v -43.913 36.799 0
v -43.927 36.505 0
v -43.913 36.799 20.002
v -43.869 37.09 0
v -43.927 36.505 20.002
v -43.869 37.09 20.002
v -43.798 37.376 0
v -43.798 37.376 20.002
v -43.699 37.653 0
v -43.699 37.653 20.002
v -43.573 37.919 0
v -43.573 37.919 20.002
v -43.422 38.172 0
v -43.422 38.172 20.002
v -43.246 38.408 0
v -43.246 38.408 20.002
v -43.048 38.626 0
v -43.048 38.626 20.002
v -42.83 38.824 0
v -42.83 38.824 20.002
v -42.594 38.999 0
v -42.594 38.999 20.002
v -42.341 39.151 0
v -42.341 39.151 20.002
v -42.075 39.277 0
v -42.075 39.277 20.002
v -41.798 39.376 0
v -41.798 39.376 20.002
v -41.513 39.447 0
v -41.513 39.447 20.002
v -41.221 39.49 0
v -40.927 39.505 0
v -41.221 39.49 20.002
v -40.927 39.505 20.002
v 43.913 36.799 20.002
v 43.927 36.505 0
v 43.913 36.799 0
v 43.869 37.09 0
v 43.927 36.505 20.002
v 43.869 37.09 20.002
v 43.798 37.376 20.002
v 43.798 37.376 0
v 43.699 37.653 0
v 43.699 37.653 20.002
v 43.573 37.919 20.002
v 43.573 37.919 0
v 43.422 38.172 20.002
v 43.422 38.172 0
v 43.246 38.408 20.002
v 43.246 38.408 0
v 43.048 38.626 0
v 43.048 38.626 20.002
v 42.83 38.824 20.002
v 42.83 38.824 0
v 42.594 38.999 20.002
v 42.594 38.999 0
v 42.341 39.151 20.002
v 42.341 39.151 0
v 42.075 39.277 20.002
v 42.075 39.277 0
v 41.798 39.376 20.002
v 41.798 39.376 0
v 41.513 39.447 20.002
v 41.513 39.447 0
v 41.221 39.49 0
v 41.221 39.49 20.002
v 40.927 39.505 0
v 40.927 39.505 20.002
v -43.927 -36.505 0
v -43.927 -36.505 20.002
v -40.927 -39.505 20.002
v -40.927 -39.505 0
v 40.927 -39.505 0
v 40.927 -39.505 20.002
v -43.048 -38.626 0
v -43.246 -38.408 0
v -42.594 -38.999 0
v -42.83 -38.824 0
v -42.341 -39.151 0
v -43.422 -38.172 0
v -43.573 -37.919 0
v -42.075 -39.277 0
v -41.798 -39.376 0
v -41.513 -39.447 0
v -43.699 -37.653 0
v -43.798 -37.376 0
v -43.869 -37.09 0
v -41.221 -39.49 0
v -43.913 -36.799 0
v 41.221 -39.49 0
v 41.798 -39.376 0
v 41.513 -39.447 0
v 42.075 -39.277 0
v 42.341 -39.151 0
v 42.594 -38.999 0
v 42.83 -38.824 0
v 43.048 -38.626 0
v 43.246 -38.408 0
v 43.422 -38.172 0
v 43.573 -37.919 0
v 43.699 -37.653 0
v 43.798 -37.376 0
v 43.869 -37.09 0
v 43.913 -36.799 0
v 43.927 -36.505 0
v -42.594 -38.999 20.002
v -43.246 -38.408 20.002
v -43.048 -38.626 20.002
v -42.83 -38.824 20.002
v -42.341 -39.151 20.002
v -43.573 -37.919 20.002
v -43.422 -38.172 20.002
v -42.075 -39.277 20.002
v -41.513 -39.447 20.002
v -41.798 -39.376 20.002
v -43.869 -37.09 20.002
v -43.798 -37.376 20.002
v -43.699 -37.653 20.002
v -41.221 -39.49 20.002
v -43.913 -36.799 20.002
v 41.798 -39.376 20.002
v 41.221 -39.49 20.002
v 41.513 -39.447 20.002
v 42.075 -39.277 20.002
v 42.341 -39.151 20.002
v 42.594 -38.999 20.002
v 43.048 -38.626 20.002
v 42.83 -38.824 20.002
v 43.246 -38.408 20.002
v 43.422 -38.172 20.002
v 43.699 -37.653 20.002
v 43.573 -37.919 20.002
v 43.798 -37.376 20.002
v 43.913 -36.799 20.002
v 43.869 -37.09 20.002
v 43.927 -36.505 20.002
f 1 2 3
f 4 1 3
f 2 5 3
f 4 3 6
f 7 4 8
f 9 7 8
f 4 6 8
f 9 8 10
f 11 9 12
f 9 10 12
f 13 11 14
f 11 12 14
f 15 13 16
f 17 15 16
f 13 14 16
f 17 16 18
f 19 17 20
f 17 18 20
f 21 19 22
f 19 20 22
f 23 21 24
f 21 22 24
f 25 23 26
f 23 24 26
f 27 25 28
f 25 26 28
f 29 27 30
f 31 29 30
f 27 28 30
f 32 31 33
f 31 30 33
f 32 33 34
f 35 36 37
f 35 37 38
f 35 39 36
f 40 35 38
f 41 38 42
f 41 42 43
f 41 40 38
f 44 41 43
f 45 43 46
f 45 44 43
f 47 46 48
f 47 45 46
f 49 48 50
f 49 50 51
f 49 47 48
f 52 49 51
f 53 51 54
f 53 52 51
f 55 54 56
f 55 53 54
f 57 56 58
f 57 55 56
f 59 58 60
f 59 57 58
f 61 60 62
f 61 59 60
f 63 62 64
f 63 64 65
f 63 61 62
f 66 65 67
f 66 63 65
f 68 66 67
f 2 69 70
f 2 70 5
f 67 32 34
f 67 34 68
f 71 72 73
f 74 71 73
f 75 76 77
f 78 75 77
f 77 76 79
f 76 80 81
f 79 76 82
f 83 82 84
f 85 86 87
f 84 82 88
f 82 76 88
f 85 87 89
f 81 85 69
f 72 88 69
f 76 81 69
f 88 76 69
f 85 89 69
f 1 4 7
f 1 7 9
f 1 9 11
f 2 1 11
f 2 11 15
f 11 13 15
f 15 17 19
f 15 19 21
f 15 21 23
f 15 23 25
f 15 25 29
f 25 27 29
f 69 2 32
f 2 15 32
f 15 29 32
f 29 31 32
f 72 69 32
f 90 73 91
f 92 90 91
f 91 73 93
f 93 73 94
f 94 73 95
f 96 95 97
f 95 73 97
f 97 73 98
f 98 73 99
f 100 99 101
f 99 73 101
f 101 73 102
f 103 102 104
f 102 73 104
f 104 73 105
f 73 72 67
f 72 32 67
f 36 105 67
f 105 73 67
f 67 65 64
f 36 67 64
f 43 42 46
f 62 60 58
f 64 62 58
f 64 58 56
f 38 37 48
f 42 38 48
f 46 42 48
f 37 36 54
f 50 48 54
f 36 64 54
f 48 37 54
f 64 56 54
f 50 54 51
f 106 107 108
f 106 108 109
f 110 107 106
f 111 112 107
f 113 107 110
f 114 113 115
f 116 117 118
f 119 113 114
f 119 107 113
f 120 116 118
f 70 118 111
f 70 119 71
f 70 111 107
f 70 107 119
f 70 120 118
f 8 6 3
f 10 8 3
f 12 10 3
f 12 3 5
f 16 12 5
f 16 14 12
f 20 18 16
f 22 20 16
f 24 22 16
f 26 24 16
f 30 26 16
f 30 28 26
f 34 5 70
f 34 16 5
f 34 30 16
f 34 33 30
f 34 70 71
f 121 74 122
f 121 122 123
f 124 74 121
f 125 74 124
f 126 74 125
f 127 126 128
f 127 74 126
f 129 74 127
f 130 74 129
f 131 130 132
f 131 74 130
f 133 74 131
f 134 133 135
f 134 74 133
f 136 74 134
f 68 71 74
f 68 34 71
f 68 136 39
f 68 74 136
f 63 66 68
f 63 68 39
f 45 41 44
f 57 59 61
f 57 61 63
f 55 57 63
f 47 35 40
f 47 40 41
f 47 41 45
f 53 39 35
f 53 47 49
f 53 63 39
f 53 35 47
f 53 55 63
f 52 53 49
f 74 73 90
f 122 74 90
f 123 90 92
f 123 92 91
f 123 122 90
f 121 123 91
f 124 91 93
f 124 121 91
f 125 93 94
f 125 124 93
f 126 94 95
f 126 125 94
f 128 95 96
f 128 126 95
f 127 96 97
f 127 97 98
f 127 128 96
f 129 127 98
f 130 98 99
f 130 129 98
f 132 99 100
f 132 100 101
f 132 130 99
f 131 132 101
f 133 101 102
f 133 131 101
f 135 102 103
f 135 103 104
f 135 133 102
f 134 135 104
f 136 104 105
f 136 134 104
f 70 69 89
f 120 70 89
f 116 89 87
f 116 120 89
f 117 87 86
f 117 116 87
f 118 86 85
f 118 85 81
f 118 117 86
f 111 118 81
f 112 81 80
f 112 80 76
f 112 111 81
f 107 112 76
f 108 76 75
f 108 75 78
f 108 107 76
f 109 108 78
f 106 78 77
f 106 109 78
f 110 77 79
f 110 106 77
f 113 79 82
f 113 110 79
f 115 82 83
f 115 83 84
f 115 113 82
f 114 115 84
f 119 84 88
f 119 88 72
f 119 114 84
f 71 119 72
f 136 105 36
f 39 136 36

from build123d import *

# Parameters (mm, degrees)
F0_W     = 87.854154
F0_H     = 79.009854
F1_DEPTH = 20.0025
F2_R     = 2.99974
F3_R     = 2.99974


with BuildPart() as f1:
    # F0 (on Top) → F1 (new body)
    with BuildSketch(Plane.XY):
        Rectangle(F0_W, F0_H)
    extrude(amount=F1_DEPTH)

    # F2
    f2_edges = [f1.edges().sort_by_distance(p)[0] for p in [
        (-43.927077, -39.504927, 10.00125),
        (43.927077, -39.504927, 10.00125),
        (43.927077, 39.504927, 10.00125),
    ]]
    fillet(f2_edges, radius=F2_R)

    # F3
    f3_edges = [f1.edges().sort_by_distance(p)[0] for p in [
        (-43.927077, 39.504927, 10.00125),
    ]]
    fillet(f3_edges, radius=F3_R)


solid = f1.part
